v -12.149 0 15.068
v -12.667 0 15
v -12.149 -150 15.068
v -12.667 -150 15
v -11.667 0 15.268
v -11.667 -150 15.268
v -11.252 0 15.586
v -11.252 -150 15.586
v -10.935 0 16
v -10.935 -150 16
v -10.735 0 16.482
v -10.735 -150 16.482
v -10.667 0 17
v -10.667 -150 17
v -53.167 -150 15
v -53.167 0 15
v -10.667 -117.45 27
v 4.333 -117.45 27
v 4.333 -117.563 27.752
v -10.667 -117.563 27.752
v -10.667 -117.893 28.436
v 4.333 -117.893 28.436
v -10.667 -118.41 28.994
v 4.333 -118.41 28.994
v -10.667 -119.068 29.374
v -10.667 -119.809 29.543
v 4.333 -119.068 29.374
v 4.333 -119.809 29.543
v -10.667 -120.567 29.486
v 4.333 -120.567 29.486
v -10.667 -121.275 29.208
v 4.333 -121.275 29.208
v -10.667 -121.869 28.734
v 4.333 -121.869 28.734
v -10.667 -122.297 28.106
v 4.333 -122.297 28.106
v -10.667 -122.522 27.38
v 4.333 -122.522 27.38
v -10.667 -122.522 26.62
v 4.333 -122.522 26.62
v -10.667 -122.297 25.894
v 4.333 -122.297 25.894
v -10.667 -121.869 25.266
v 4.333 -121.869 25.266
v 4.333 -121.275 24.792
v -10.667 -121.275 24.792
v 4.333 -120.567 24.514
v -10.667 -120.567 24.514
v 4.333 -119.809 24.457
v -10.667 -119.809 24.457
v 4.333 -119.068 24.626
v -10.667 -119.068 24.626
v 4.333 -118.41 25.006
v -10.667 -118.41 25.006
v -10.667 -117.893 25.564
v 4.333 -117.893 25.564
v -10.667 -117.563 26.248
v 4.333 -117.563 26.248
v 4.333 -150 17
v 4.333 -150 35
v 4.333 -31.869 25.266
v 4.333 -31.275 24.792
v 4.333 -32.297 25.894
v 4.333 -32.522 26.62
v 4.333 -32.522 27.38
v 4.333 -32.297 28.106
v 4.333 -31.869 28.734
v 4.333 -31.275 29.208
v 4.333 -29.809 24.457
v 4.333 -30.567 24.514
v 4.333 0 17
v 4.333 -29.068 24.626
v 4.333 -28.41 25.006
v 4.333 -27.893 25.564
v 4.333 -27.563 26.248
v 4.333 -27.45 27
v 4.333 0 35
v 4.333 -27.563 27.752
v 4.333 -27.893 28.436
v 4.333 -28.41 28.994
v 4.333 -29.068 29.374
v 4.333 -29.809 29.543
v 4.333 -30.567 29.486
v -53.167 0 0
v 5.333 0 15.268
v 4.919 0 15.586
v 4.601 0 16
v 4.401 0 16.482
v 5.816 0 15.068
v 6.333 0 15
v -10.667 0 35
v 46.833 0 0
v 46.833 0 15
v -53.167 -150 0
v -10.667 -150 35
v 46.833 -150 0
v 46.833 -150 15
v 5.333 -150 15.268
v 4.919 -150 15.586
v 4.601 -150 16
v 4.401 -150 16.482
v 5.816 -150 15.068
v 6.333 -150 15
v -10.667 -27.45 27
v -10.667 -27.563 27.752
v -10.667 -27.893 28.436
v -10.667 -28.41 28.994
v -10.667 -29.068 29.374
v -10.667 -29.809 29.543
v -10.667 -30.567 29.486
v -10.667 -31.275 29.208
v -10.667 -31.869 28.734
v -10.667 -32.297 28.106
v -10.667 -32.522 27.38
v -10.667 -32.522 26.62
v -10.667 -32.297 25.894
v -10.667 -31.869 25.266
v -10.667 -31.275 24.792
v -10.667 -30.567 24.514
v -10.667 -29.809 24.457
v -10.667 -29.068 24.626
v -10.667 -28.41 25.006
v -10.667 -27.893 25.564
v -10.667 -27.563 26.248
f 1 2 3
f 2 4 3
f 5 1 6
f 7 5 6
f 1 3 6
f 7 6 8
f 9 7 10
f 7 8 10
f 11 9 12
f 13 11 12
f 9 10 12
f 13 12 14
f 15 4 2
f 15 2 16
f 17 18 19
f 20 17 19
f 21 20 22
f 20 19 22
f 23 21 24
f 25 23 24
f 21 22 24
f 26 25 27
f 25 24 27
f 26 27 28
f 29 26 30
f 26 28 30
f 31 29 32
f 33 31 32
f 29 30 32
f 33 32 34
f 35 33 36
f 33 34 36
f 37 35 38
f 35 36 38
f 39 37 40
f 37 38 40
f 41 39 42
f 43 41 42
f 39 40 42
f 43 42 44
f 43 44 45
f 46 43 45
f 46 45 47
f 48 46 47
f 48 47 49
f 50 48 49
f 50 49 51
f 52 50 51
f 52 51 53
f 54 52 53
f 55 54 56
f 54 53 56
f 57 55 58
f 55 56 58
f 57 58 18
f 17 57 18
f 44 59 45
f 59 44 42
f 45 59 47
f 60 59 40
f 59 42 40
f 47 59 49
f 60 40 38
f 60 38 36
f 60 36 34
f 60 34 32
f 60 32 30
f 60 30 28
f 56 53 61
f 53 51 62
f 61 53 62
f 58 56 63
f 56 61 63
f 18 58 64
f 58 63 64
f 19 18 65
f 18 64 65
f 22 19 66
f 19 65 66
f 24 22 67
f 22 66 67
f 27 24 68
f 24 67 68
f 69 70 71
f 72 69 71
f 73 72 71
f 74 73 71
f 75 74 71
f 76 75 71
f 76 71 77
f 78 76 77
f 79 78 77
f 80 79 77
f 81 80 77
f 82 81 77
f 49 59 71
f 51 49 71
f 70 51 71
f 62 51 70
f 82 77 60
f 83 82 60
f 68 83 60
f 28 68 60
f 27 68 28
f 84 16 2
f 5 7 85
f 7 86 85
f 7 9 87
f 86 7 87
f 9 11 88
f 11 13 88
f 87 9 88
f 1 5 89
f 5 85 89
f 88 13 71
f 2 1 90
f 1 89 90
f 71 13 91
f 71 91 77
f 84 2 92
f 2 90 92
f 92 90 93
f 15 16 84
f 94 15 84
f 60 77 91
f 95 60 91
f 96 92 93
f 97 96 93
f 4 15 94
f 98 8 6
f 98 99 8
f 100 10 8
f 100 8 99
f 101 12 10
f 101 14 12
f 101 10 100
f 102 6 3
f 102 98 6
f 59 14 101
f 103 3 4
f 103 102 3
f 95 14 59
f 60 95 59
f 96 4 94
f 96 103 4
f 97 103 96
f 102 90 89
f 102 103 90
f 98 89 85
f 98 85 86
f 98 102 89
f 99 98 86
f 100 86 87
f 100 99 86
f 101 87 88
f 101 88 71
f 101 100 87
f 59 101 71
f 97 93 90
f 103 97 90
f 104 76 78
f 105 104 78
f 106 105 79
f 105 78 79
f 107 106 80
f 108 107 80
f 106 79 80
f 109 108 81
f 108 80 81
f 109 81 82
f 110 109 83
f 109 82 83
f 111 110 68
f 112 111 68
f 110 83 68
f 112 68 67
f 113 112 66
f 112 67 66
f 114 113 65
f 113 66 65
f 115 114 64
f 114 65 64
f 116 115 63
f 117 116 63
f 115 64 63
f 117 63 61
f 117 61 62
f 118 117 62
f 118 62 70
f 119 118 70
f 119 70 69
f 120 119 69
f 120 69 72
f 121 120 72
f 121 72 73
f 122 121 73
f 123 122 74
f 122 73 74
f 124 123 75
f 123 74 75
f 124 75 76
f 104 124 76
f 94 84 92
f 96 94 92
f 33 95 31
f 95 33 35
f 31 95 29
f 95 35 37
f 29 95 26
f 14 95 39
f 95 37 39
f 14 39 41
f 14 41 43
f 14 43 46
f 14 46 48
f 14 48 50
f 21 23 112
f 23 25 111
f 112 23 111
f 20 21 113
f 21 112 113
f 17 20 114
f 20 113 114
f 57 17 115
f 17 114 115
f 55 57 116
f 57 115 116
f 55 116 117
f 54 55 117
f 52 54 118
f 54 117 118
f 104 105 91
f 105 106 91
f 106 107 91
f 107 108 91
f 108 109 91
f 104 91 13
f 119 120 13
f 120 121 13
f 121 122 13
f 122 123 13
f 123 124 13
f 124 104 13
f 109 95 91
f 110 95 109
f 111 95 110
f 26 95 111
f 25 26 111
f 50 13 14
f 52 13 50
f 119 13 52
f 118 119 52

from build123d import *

# Parameters (mm, degrees)
F1_DEPTH = 150
F2_R     = 2.55
F3_DEPTH = 15
F4_R     = 2


with BuildPart() as f1:
    # F0 (on Front) → F1 (new body)
    with BuildSketch(Plane.XZ):
        Polygon((-53.166667, 15), (-53.166667, 0), (46.833333, 0), (46.833333, 15), (4.333333, 15), (4.333333, 35), (-10.666667, 35), (-10.666667, 15), align=None)
    extrude(amount=F1_DEPTH)

    # F2 (on face) → F3 (cut, through all)
    with BuildSketch(Plane.YZ.offset(4.333333)):
        with Locations((-120, 27)):
            Circle(F2_R)
        with Locations((-30, 27)):
            Circle(F2_R)
    extrude(amount=-F3_DEPTH, mode=Mode.SUBTRACT)

    # F4
    f4_edges = [f1.edges().sort_by_distance(p)[0] for p in [
        (-10.666667, -75, 15),
        (4.333333, -75, 15),
    ]]
    fillet(f4_edges, radius=F4_R)


solid = f1.part
